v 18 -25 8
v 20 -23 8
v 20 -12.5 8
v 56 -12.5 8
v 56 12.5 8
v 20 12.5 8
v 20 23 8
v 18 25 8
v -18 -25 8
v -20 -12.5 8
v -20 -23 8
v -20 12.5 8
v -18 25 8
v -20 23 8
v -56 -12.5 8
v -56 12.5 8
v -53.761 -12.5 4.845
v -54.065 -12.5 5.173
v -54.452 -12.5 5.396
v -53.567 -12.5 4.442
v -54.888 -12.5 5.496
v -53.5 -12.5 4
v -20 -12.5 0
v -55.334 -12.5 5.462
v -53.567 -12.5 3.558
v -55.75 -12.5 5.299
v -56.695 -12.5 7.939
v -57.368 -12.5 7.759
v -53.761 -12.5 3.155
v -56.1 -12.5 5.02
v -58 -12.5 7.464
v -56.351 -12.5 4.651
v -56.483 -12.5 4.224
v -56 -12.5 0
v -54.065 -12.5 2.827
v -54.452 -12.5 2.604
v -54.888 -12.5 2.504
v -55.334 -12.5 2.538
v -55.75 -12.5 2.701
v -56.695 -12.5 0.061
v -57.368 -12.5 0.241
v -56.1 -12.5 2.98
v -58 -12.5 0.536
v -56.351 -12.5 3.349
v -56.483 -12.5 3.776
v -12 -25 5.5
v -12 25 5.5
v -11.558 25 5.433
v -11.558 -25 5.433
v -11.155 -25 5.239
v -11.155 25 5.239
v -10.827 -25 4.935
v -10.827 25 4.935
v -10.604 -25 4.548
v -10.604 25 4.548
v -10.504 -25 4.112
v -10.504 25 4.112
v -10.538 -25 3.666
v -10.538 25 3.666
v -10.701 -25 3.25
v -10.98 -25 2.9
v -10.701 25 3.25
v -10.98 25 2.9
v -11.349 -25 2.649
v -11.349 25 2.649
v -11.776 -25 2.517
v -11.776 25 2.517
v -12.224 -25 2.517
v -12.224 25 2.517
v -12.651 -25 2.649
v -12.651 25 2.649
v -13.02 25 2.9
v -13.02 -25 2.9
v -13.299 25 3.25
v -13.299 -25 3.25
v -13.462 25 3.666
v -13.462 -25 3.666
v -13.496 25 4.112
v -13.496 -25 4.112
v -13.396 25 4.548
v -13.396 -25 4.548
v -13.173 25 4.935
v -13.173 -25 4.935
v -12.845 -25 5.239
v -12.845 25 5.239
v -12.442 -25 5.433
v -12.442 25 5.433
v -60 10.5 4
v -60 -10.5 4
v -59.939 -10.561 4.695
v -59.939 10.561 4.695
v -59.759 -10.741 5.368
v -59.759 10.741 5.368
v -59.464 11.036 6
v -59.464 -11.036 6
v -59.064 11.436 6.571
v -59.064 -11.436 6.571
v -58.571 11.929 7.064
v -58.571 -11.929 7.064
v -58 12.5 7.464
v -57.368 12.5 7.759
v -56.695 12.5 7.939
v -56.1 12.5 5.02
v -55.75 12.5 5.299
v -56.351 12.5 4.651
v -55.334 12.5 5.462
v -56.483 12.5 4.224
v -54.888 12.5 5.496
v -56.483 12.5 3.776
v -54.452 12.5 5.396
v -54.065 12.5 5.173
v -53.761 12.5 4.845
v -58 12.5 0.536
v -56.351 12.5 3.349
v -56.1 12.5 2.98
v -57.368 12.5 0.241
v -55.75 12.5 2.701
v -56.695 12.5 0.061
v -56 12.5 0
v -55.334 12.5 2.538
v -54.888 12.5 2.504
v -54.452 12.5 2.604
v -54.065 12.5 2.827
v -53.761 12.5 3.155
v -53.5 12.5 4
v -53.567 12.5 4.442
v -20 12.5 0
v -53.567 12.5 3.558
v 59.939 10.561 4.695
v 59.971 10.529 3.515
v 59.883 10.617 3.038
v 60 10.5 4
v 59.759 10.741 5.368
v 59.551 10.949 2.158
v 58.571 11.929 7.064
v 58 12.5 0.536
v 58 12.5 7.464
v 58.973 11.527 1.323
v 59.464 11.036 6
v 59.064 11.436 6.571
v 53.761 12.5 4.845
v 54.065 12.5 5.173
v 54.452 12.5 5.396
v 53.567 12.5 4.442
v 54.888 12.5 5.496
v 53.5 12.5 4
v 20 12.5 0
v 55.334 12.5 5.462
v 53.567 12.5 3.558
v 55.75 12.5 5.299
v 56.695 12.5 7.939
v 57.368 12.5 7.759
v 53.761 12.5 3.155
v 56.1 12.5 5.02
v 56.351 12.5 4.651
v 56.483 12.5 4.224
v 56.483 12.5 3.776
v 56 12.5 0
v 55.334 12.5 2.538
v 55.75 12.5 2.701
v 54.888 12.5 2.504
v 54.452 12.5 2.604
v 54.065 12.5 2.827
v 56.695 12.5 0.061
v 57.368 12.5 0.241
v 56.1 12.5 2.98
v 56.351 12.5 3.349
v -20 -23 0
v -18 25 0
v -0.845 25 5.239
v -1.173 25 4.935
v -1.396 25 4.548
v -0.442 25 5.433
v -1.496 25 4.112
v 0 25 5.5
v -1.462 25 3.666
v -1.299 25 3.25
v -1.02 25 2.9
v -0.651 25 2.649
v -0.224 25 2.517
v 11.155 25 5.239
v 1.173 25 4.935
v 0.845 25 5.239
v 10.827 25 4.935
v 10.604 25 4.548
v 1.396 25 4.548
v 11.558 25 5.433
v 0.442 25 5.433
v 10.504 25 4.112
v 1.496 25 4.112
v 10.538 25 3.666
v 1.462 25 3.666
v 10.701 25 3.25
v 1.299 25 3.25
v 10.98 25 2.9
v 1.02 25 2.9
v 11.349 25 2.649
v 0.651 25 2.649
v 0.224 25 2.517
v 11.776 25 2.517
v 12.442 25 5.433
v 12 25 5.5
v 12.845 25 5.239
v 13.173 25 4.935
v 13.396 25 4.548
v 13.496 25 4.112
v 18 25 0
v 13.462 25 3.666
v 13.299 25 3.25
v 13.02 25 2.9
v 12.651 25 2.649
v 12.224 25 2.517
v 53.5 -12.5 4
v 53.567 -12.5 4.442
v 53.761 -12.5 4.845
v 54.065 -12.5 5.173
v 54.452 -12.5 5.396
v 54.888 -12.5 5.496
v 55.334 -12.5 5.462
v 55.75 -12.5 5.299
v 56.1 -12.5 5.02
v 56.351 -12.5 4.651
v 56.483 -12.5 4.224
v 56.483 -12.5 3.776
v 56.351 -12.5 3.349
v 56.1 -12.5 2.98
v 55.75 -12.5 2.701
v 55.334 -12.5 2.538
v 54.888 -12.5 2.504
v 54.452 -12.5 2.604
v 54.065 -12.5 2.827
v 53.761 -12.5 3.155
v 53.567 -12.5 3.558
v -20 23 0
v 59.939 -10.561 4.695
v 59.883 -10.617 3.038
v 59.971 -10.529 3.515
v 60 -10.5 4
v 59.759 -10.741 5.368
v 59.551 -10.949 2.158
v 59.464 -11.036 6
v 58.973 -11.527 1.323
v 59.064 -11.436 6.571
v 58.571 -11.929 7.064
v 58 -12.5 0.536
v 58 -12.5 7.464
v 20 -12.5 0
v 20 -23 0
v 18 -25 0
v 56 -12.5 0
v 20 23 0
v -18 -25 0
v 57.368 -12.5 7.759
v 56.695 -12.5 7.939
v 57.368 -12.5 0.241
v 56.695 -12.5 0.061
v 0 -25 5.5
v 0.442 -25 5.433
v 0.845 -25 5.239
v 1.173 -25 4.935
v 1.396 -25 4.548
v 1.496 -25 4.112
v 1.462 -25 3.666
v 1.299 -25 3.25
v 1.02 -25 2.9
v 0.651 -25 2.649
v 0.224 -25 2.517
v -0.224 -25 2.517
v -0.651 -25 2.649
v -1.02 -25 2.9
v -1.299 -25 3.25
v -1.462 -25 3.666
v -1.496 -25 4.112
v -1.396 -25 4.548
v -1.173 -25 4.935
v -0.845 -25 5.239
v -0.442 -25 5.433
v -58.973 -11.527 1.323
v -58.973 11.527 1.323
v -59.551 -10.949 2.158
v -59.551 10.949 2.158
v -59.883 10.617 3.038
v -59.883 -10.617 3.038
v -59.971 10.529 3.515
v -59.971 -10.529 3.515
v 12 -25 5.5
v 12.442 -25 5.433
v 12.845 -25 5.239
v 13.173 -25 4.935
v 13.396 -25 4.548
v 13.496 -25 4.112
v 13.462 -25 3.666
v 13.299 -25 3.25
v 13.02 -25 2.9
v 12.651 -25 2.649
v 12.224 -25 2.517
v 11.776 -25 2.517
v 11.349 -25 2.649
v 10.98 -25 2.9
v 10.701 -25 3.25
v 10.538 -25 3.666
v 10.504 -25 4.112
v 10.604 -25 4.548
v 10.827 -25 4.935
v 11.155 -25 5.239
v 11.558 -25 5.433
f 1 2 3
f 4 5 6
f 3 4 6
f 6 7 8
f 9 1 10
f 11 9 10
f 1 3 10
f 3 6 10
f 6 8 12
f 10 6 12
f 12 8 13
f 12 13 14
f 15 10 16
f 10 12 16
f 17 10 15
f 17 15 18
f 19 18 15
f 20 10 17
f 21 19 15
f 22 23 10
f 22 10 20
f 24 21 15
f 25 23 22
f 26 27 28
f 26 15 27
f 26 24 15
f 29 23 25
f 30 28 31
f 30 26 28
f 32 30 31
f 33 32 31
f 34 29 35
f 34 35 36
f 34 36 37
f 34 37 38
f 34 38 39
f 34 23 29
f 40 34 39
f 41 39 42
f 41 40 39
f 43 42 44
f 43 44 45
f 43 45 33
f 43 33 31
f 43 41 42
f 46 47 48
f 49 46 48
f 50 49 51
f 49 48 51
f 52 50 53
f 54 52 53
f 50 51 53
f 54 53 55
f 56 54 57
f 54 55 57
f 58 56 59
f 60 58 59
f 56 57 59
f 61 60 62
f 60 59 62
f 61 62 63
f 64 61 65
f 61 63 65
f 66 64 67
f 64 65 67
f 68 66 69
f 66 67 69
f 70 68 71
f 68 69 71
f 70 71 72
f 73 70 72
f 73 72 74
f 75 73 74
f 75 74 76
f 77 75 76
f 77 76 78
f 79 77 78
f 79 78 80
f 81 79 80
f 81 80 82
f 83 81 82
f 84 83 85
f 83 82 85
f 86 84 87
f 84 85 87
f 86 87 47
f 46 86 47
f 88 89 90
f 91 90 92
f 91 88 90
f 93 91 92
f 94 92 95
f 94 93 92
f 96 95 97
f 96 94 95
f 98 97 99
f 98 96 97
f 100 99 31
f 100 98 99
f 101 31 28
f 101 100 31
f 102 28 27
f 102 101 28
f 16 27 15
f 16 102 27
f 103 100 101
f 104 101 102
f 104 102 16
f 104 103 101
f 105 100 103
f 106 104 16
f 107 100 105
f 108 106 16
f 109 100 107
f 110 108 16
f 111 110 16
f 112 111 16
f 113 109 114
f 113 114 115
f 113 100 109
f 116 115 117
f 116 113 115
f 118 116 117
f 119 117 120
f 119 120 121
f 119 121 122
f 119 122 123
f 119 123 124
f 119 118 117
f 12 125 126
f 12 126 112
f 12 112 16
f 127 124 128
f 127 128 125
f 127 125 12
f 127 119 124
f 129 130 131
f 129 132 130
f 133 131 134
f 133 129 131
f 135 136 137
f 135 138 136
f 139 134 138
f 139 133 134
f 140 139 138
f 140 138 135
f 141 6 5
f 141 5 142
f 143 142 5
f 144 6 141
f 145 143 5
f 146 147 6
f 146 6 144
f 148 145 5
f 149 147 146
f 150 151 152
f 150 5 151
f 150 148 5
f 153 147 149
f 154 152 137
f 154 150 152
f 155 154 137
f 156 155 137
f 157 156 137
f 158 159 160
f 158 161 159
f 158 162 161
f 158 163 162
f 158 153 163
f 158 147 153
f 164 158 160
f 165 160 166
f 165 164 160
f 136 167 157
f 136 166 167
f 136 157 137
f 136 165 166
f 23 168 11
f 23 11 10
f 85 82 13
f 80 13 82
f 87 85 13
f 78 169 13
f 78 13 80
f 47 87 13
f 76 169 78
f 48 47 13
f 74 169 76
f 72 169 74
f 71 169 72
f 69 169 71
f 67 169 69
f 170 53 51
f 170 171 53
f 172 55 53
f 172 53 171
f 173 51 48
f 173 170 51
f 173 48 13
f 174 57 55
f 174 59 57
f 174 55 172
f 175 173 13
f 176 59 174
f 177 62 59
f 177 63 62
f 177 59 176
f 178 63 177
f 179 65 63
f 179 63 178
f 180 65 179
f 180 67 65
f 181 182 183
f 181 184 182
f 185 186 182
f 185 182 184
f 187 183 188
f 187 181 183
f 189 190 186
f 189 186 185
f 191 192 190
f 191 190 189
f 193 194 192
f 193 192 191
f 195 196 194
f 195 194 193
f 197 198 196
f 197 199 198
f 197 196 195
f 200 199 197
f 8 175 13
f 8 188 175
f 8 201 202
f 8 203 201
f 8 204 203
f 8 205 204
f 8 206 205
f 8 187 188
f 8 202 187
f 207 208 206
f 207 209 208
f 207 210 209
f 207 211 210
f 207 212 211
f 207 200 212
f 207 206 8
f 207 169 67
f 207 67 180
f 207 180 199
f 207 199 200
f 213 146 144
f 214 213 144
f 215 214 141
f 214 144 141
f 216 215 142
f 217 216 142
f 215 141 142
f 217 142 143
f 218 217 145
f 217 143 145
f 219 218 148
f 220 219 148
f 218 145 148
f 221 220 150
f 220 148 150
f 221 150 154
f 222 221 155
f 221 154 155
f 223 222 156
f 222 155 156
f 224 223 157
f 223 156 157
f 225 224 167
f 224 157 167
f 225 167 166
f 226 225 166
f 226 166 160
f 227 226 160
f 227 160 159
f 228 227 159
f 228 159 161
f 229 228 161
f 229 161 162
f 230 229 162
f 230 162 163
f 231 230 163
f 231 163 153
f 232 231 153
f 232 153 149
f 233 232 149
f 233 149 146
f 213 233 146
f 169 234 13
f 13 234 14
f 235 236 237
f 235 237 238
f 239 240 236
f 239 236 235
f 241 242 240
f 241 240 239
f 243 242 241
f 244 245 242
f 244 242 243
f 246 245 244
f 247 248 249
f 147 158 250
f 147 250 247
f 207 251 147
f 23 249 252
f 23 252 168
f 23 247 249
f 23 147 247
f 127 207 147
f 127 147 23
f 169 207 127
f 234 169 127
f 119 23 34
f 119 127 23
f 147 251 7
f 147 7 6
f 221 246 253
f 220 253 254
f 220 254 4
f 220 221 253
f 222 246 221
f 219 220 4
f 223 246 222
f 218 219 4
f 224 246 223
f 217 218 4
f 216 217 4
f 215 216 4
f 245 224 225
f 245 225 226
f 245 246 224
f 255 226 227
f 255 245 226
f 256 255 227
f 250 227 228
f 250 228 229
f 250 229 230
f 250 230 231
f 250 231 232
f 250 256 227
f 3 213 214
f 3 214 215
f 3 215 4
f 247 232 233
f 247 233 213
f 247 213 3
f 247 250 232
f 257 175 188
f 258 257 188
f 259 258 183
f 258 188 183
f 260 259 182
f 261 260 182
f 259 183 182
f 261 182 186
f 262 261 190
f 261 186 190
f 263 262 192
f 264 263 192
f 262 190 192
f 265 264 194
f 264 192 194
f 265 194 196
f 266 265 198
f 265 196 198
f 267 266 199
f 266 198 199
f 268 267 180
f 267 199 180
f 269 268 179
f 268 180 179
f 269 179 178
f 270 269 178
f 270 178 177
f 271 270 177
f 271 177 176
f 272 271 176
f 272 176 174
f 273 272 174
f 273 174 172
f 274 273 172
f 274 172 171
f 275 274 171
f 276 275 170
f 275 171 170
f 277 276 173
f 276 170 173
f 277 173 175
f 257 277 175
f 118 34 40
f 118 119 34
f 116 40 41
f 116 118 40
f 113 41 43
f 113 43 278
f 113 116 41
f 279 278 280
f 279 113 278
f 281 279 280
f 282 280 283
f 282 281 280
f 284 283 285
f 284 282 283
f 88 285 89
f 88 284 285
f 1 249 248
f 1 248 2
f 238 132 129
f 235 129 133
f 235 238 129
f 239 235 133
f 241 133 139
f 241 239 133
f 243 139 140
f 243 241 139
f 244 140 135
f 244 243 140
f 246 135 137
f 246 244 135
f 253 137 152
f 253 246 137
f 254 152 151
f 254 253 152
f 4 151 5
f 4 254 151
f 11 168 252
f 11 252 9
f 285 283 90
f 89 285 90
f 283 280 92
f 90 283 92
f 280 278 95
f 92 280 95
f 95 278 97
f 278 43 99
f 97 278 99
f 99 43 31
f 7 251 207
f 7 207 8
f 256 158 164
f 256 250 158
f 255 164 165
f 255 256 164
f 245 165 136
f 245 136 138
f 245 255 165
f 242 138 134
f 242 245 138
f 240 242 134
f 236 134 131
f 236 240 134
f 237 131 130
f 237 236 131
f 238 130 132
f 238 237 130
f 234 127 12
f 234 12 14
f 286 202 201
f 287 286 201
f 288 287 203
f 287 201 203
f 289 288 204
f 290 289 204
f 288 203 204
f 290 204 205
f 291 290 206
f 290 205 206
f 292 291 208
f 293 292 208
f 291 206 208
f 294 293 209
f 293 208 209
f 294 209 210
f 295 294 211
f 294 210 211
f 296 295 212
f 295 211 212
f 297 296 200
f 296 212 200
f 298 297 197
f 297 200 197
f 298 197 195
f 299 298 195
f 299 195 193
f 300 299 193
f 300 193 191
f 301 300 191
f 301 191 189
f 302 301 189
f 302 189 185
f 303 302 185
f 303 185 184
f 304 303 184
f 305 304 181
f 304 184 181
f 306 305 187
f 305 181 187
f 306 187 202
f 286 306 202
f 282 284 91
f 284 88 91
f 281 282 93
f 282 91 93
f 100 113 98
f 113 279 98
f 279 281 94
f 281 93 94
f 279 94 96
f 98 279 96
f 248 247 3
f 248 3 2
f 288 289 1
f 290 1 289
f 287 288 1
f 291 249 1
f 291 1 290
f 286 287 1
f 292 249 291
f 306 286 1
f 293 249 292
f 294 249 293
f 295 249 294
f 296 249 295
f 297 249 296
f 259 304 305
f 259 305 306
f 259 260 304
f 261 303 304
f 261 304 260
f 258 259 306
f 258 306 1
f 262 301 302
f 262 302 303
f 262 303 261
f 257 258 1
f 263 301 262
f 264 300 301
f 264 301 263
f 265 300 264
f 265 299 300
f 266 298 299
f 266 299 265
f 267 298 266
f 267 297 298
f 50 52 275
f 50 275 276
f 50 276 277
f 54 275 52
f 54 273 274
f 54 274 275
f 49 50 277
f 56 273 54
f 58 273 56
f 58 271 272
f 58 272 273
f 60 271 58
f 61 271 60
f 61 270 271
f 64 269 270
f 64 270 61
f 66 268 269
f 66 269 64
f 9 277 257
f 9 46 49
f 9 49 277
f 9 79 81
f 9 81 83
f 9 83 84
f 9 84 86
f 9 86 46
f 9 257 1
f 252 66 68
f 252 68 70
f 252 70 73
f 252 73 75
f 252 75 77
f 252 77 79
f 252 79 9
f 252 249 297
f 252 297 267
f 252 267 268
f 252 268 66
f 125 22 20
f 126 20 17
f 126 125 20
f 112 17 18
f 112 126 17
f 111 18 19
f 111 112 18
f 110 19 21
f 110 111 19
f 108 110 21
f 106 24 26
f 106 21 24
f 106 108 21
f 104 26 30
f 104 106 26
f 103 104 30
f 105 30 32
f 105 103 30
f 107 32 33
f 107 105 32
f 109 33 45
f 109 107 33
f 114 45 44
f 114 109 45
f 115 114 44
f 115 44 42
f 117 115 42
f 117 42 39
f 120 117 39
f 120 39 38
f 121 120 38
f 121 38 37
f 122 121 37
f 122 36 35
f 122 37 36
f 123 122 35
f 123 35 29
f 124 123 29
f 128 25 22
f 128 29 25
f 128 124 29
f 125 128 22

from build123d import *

# Parameters (mm, degrees)
EXTRUDE_1_DEPTH     = 8
CHAMFER_1_SIZE      = 2
SKETCH_4_R          = 1.5
CUT_EXTRUDE_3_DEPTH = 50
CHAMFER_3_SIZE      = 2
FILLET_1_R          = 4
SKETCH_6_R          = 1.5
CUT_EXTRUDE_5_DEPTH = 72.205687975


with BuildPart() as part:
    # 草图1 → 凸台-拉伸1 (new body)
    with BuildSketch(Plane.XY):
        Polygon((-20, 25), (20, 25), (20, 12.5), (60, 12.5), (60, -12.5), (20, -12.5), (20, -25), (-20, -25), (-20, -12.5), (-60, -12.5), (-60, 12.5), (-20, 12.5), align=None)
    extrude(amount=EXTRUDE_1_DEPTH)

    # 倒角1
    chamfer_1_edges = [part.edges().sort_by_distance(p)[0] for p in [
        (20, -25, 4),
        (-20, -25, 4),
        (-20, 25, 4),
        (20, 25, 4),
    ]]
    chamfer(chamfer_1_edges, length=CHAMFER_1_SIZE)

    # 草图4 → 切除-拉伸3 (cut)
    with BuildSketch(Plane(origin=(0, 25, 0), x_dir=(1, 0, 0), z_dir=(0, 1, 0))):
        with Locations(Location((-12, -4, 0), (0, 0, 270))):
            Circle(SKETCH_4_R)
        with Locations(Location((0, -4, 0), (0, 0, 270))):
            Circle(SKETCH_4_R)
        with Locations(Location((12, -4, 0), (0, 0, 270))):
            Circle(SKETCH_4_R)
    extrude(amount=-CUT_EXTRUDE_3_DEPTH, mode=Mode.SUBTRACT)

    # 倒角3
    chamfer_3_edges = [part.edges().sort_by_distance(p)[0] for p in [
        (-60, -12.5, 4),
        (-60, 12.5, 4),
        (60, 12.5, 4),
        (60, -12.5, 4),
    ]]
    chamfer(chamfer_3_edges, length=CHAMFER_3_SIZE)

    # 圆角1
    fillet_1_edges = [part.edges().sort_by_distance(p)[0] for p in [
        (60, 0, 0),
        (60, 0, 8),
        (-60, 0, 0),
        (-60, 0, 8),
    ]]
    fillet(fillet_1_edges, radius=FILLET_1_R - 0.0001)  # a hair under: the kernel refuses the full size

    # 草图6 → 切除-拉伸5 (cut, through all)
    with BuildSketch(Plane(origin=(0, 12.5, 0), x_dir=(1, 0, 0), z_dir=(0, 1, 0))):
        with Locations(Location((55, -4, 0), (0, 0, 180))):
            Circle(SKETCH_6_R)
    cut_extrude_5 = extrude(amount=-CUT_EXTRUDE_5_DEPTH, mode=Mode.SUBTRACT)

    # 镜向4: 切除-拉伸5 across plane
    add(cut_extrude_5.mirror(Plane(origin=(0, 0, 0), x_dir=(0, 0, 1), z_dir=(1, 0, 0))), mode=Mode.SUBTRACT)


solid = part.part
